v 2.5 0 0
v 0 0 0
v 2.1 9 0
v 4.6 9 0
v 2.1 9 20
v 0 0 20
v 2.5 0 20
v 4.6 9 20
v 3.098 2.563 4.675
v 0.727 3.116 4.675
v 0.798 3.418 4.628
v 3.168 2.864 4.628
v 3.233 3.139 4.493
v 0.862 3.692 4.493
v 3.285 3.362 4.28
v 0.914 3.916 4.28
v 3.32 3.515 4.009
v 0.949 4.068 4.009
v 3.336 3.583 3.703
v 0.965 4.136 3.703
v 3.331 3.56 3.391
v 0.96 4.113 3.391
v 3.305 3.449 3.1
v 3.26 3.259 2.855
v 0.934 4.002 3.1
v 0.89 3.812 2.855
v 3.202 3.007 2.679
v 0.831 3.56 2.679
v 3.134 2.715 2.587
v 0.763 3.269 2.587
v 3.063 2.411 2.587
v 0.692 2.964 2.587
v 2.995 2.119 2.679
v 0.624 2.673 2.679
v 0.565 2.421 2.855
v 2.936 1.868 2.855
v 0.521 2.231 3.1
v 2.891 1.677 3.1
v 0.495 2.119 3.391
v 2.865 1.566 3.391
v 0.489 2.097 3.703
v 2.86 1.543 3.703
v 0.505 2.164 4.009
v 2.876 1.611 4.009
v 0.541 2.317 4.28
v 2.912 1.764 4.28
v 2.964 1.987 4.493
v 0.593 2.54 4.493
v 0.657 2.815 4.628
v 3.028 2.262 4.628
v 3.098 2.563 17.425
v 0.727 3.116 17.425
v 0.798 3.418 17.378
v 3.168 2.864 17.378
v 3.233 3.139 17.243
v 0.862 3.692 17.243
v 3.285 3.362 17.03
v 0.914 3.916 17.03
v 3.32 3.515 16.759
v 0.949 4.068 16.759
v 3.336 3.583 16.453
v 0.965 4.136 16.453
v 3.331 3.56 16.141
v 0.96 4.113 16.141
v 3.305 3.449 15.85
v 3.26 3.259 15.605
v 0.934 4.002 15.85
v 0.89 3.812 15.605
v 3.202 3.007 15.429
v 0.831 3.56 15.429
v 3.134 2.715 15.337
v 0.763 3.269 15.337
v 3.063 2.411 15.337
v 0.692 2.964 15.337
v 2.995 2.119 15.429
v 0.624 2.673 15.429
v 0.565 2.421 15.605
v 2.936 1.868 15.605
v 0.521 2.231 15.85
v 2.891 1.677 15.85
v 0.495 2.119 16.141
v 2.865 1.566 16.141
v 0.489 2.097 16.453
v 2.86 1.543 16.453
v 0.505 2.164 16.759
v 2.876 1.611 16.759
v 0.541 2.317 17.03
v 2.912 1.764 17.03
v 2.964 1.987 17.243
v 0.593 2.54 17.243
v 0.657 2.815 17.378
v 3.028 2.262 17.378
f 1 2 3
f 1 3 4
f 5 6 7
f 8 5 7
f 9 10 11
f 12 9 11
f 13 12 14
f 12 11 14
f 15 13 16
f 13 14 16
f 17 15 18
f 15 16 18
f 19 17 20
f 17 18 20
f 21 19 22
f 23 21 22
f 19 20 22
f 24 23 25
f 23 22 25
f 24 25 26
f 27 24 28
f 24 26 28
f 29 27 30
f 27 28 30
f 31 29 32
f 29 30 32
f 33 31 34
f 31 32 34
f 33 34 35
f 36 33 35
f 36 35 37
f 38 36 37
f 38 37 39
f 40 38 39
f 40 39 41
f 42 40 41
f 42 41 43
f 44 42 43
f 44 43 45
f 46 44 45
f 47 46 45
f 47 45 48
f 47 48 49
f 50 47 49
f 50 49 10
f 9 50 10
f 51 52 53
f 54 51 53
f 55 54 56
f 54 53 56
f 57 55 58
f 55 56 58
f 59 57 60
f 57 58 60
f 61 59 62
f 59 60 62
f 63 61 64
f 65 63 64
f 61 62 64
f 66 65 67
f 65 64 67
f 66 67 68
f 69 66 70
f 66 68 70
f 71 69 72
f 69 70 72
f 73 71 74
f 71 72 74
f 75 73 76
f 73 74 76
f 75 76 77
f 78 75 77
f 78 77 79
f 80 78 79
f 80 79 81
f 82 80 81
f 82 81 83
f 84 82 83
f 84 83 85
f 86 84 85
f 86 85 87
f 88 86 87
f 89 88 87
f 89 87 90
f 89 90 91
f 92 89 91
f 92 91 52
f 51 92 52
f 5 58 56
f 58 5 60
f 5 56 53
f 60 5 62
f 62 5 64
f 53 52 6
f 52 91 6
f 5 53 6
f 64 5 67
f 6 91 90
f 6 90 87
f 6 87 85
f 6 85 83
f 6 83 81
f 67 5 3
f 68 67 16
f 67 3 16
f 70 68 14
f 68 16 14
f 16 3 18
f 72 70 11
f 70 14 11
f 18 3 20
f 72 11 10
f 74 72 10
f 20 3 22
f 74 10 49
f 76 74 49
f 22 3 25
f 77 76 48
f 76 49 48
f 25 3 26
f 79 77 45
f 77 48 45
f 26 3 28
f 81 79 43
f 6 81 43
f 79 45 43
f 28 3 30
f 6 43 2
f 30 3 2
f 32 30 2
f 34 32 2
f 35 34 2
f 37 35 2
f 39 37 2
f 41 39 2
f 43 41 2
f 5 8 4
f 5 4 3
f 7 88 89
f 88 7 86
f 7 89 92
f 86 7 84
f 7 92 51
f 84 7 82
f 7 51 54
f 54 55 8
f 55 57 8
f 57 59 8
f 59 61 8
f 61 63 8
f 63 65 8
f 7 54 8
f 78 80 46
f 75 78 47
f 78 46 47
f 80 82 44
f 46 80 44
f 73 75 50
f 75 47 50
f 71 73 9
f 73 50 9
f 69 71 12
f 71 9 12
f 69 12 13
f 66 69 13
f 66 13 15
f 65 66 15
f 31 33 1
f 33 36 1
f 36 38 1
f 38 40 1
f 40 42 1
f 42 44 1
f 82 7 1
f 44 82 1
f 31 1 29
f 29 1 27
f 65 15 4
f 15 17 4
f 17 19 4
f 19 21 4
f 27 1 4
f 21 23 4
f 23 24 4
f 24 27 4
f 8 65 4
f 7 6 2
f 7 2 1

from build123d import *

# Parameters (mm, degrees)
BOSS_EXTRUDE2_DEPTH = 20
SKETCH4_R           = 1.05
CUT_EXTRUDE1_DEPTH  = 5.479855617


with BuildPart() as part:
    # Sketch2 → Boss-Extrude2 (new body)
    with BuildSketch(Plane.XY):
        Polygon((0, 0), (2.5, 0), (4.600215416, 9), (2.100215416, 9), align=None)
    extrude(amount=BOSS_EXTRUDE2_DEPTH)

    # Sketch4 → Cut-Extrude1 (cut, through all)
    with BuildSketch(Plane(origin=(0, 0, 0), x_dir=(0, 0, 1), z_dir=(-0.973836052, 0.227251721, 0))):
        with Locations((3.625, 3.2)):
            Circle(SKETCH4_R)
        with Locations((16.375, 3.2)):
            Circle(SKETCH4_R)
    extrude(amount=-CUT_EXTRUDE1_DEPTH, mode=Mode.SUBTRACT)


solid = part.part
